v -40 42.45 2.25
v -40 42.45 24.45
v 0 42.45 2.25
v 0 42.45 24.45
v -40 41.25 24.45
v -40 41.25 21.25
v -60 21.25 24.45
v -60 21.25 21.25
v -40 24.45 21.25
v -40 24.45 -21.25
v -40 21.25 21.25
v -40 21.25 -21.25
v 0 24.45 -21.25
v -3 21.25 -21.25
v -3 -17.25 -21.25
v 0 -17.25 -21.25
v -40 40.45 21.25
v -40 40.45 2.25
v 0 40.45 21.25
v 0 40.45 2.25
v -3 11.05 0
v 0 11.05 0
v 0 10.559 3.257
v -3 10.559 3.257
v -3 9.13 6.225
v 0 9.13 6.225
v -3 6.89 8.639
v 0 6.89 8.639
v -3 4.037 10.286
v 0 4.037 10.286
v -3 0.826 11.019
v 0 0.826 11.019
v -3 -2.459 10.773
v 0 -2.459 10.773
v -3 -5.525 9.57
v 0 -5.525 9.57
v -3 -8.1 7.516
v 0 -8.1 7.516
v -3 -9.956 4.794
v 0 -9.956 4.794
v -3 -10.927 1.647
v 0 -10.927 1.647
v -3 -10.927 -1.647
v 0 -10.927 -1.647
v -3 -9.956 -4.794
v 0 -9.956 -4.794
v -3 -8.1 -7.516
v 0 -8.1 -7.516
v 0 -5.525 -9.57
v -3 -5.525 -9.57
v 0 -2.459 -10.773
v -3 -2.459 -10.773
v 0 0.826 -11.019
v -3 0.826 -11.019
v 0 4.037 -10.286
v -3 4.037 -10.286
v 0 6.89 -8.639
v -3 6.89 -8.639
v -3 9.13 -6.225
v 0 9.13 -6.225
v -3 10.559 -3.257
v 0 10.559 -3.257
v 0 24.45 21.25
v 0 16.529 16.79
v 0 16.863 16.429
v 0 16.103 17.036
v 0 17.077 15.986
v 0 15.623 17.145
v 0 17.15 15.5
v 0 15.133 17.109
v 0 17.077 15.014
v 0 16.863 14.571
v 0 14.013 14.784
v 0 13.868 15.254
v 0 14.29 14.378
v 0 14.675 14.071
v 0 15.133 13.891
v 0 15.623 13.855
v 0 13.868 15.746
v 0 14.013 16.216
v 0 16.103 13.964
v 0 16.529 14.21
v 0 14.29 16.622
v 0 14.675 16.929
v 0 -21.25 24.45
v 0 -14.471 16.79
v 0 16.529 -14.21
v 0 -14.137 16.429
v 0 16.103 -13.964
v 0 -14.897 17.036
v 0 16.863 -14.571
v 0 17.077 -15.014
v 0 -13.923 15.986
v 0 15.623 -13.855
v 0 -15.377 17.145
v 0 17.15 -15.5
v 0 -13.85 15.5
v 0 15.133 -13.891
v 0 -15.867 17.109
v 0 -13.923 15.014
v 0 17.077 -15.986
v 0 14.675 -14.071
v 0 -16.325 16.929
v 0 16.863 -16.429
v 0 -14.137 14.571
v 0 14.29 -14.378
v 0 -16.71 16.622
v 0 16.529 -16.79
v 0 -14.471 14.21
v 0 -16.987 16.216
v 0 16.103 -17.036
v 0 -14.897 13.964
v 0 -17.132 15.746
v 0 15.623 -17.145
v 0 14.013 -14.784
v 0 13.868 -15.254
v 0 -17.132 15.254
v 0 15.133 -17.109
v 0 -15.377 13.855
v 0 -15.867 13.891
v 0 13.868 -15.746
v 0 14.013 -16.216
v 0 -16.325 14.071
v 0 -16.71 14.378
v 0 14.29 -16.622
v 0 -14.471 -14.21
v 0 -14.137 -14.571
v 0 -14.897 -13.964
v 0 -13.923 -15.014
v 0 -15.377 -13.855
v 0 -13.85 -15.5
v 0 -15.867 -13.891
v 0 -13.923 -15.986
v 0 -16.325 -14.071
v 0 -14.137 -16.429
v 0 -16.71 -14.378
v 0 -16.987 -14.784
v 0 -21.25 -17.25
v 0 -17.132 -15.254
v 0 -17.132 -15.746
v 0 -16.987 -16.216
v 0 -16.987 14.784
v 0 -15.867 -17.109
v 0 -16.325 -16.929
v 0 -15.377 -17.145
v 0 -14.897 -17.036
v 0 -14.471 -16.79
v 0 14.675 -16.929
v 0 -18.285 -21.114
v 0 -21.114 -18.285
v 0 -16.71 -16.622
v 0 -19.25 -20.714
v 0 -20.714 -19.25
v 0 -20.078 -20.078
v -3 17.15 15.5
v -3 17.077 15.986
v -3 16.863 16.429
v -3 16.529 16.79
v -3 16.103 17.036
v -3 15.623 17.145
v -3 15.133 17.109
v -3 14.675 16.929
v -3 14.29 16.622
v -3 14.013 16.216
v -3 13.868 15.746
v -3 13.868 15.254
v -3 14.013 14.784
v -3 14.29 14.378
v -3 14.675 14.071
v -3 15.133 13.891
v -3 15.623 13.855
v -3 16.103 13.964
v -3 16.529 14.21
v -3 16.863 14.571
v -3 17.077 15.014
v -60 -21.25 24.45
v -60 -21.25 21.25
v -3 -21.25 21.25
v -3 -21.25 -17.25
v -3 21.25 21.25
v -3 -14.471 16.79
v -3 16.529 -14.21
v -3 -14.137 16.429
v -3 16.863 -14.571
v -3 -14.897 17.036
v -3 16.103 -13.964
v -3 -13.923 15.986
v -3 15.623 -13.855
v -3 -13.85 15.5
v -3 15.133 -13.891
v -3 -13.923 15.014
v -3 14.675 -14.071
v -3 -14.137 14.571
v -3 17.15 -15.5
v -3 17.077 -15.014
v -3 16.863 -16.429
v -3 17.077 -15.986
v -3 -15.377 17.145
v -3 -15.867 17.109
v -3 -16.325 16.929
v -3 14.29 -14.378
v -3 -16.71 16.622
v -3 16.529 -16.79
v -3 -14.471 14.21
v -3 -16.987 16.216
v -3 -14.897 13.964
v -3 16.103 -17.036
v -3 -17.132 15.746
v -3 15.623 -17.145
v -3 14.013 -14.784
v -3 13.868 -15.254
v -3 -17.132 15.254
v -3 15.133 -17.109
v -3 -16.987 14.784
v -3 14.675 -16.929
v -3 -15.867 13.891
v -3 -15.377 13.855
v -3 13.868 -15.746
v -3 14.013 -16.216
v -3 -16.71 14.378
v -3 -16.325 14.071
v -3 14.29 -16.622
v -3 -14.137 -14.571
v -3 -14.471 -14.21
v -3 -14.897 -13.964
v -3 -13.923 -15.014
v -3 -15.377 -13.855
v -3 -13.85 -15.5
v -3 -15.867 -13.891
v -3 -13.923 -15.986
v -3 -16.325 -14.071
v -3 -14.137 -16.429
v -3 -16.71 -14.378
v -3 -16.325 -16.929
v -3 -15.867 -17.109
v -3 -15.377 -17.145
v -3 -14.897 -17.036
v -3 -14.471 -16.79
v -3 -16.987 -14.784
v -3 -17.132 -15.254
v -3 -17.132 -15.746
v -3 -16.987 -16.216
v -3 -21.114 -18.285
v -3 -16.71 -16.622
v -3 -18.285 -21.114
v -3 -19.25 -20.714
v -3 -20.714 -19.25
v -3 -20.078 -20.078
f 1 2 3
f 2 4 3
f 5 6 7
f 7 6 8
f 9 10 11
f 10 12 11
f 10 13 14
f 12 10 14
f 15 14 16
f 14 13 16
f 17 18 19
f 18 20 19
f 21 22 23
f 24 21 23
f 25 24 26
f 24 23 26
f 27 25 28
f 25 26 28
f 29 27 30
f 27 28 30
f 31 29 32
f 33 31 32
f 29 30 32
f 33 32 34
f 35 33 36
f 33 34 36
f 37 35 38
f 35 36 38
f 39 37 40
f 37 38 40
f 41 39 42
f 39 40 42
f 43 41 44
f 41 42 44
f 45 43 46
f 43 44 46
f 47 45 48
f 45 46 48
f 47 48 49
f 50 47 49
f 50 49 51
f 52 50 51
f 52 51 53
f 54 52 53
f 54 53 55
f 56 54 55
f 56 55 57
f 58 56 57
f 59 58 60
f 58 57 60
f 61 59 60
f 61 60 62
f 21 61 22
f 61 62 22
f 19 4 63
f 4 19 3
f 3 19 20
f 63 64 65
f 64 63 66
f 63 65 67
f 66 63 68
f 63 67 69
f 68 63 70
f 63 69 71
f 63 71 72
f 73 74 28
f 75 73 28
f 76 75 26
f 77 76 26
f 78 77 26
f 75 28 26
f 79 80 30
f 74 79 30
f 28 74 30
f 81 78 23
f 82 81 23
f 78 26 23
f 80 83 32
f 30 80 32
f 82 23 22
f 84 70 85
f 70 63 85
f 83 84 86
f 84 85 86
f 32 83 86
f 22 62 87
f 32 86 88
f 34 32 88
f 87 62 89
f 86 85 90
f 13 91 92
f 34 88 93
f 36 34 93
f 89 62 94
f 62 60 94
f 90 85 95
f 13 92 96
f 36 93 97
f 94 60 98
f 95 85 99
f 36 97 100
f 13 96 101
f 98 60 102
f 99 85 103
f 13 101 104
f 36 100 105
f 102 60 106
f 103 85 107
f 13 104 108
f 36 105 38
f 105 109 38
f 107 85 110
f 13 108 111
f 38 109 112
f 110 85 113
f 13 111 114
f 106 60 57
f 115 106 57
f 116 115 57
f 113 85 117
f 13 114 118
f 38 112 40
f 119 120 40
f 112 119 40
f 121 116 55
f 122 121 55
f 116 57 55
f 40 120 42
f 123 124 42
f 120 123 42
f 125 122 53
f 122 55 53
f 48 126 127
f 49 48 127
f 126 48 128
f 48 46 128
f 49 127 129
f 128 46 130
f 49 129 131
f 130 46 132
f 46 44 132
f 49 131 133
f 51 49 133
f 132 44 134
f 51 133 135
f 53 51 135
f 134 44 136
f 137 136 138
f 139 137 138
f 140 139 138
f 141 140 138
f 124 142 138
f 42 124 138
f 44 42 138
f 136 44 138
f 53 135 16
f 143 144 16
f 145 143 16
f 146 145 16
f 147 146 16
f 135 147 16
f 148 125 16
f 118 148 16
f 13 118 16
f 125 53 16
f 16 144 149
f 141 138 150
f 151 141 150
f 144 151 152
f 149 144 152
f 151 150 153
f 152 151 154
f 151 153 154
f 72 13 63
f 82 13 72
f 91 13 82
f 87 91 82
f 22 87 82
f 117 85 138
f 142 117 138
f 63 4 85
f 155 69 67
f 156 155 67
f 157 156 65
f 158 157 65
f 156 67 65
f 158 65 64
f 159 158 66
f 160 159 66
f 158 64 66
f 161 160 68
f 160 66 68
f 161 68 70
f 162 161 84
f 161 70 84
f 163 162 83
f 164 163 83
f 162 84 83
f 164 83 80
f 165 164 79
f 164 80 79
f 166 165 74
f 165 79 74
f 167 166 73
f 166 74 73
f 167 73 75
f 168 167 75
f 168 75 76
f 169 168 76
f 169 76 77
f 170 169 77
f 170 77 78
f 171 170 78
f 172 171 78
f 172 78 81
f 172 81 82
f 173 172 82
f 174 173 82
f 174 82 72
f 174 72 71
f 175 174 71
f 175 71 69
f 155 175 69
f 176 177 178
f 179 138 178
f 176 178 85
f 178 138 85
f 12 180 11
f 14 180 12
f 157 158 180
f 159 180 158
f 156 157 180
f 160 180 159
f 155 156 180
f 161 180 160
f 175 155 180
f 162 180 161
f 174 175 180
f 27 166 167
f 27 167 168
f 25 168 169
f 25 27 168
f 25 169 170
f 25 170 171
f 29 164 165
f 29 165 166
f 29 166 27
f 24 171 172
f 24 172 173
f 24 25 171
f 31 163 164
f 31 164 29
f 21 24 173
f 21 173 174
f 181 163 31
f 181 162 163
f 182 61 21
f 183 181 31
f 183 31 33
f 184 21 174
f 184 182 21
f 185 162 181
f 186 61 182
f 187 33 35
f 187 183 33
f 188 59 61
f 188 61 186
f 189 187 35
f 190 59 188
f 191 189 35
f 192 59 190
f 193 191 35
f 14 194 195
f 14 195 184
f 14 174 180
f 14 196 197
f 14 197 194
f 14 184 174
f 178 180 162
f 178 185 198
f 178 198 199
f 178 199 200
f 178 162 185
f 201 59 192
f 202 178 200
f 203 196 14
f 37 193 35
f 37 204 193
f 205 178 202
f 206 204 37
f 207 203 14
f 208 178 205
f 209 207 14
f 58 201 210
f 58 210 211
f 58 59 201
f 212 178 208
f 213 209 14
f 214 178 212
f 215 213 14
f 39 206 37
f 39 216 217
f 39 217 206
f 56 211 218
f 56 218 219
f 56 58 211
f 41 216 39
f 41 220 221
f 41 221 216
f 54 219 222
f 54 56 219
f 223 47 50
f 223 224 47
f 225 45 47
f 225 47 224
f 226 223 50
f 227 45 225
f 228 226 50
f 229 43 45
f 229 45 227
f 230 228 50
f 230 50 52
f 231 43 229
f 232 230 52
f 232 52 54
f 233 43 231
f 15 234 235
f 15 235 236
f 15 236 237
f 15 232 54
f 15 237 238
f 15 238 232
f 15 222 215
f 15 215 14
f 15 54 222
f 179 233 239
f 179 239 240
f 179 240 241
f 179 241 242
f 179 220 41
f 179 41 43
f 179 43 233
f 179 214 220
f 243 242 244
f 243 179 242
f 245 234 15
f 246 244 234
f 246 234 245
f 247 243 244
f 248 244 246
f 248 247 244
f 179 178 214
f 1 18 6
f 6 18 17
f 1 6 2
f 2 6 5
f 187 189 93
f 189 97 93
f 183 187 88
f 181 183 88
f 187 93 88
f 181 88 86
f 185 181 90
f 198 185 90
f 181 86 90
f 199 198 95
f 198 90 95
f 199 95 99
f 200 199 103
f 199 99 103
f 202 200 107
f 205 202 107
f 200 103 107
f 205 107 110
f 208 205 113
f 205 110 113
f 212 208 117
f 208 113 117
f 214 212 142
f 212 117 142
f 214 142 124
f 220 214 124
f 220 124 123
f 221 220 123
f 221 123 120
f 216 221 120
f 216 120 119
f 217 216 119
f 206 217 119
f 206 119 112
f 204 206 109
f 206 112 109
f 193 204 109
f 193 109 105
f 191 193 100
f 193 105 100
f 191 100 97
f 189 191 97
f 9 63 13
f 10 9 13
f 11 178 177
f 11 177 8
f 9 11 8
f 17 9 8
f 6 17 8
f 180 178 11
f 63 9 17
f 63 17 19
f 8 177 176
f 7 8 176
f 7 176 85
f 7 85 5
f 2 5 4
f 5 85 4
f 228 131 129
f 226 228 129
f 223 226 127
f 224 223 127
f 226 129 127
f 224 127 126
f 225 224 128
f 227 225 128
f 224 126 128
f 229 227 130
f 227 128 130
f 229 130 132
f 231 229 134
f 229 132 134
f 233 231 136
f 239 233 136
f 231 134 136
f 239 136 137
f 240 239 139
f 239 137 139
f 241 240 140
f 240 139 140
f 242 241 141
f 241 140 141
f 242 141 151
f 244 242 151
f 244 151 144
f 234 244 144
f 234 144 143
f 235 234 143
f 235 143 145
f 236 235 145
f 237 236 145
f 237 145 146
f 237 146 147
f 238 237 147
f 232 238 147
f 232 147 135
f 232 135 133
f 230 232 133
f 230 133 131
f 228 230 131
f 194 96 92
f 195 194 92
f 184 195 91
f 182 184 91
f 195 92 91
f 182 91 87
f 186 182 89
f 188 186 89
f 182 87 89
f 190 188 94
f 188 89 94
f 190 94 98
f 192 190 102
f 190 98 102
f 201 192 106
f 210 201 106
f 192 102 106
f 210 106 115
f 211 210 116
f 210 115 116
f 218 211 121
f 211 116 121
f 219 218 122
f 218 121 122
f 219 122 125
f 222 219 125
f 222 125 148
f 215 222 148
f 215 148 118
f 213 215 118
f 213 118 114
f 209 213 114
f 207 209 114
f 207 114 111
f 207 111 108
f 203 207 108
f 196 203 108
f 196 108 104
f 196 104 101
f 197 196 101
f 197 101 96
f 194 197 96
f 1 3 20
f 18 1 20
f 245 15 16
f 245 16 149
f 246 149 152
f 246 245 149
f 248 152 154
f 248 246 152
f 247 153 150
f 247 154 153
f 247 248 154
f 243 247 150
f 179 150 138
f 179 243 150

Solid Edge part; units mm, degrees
sketch "Sketch1" plane through (0, 0, 0) normal (1, 0, 0) x (0, 1, 0)
  circle A0 centre (-15.5, -15.5) radius 1.65
  circle A1 centre (0, 0) radius 11.05
  circle A2 centre (15.5, 15.5) radius 1.65
  line L0 (-21.25, 21.25) -> (21.25, 21.25)
  line L1 (21.25, 21.25) -> (21.25, -21.25)
  line L2 (21.25, -21.25) -> (-21.25, -21.25)
  line L3 (-21.25, -21.25) -> (-21.25, 21.25)
  circle A3 centre (-15.5, 15.5) radius 1.65
  circle A4 centre (15.5, -15.5) radius 1.65
  dimension "D1" = 22.1
  dimension "D2" = 42.5
  dimension "D3" = 2
  dimension "D4" = 16
  dimension "D5" = 19
  dimension "D6" = 3.2
  dimension "D7" = 3.2
  dimension "D8" = 31
  dimension "D9" = 3.3
extrude "Protrusion1" add sketch "Sketch1" against normal blind 3
sketch "Sketch2" plane through (0, 0, 0) normal (1, 0, 0) x (0, 1, 0)
  line L0 (24.45, -21.25) -> (21.25, -21.25)
  line L1 (21.25, 21.25) -> (21.25, -21.25)
  line L2 (21.25, 21.25) -> (21.25, 24.45)
  line L3 (-21.25, 24.45) -> (42.45, 24.45)
  line L4 (42.45, 24.45) -> (42.45, 2.25)
  line L5 (42.45, 2.25) -> (40.45, 2.25)
  line L6 (40.45, 2.25) -> (40.45, 21.25)
  line L7 (40.45, 21.25) -> (24.45, 21.25)
  line L8 (24.45, 21.25) -> (24.45, -21.25)
extrude "Fensterklammer" add sketch "Sketch2" against normal blind 40 material side at (0, 22.85, -21.2)
sketch "Sketch3" plane through (0, 0, 0) normal (1, 0, 0) x (0, 1, 0)
  line L0 (-21.25, 24.45) -> (42.45, 24.45)
  line L1 (21.25, 21.25) -> (21.25, 24.45)
  line L2 (-21.25, 21.25) -> (21.25, 21.25)
  line L3 (-21.25, 21.25) -> (-21.25, 24.45)
extrude "Elektonik_Halter" add sketch "Sketch3" against normal blind 60 material side at (0, 10.6, 24.4)
sketch "Sketch4" plane through (-31.5, 0, 21.25) normal (0, 0, -1) x (0, -1, 0)
  line L0 (-41.25, 8.5) -> (-21.25, 8.5)
  line L1 (-21.25, 8.5) -> (-21.25, 28.5)
  line L2 (-41.25, 8.5) -> (-21.25, 28.5)
extrude "Protrusion2" add sketch "Sketch4" against normal up to vertex (3.2 mm away)
fillet "R4" radius 4 1 edges at (-1.5, -21.25, -21.25)
